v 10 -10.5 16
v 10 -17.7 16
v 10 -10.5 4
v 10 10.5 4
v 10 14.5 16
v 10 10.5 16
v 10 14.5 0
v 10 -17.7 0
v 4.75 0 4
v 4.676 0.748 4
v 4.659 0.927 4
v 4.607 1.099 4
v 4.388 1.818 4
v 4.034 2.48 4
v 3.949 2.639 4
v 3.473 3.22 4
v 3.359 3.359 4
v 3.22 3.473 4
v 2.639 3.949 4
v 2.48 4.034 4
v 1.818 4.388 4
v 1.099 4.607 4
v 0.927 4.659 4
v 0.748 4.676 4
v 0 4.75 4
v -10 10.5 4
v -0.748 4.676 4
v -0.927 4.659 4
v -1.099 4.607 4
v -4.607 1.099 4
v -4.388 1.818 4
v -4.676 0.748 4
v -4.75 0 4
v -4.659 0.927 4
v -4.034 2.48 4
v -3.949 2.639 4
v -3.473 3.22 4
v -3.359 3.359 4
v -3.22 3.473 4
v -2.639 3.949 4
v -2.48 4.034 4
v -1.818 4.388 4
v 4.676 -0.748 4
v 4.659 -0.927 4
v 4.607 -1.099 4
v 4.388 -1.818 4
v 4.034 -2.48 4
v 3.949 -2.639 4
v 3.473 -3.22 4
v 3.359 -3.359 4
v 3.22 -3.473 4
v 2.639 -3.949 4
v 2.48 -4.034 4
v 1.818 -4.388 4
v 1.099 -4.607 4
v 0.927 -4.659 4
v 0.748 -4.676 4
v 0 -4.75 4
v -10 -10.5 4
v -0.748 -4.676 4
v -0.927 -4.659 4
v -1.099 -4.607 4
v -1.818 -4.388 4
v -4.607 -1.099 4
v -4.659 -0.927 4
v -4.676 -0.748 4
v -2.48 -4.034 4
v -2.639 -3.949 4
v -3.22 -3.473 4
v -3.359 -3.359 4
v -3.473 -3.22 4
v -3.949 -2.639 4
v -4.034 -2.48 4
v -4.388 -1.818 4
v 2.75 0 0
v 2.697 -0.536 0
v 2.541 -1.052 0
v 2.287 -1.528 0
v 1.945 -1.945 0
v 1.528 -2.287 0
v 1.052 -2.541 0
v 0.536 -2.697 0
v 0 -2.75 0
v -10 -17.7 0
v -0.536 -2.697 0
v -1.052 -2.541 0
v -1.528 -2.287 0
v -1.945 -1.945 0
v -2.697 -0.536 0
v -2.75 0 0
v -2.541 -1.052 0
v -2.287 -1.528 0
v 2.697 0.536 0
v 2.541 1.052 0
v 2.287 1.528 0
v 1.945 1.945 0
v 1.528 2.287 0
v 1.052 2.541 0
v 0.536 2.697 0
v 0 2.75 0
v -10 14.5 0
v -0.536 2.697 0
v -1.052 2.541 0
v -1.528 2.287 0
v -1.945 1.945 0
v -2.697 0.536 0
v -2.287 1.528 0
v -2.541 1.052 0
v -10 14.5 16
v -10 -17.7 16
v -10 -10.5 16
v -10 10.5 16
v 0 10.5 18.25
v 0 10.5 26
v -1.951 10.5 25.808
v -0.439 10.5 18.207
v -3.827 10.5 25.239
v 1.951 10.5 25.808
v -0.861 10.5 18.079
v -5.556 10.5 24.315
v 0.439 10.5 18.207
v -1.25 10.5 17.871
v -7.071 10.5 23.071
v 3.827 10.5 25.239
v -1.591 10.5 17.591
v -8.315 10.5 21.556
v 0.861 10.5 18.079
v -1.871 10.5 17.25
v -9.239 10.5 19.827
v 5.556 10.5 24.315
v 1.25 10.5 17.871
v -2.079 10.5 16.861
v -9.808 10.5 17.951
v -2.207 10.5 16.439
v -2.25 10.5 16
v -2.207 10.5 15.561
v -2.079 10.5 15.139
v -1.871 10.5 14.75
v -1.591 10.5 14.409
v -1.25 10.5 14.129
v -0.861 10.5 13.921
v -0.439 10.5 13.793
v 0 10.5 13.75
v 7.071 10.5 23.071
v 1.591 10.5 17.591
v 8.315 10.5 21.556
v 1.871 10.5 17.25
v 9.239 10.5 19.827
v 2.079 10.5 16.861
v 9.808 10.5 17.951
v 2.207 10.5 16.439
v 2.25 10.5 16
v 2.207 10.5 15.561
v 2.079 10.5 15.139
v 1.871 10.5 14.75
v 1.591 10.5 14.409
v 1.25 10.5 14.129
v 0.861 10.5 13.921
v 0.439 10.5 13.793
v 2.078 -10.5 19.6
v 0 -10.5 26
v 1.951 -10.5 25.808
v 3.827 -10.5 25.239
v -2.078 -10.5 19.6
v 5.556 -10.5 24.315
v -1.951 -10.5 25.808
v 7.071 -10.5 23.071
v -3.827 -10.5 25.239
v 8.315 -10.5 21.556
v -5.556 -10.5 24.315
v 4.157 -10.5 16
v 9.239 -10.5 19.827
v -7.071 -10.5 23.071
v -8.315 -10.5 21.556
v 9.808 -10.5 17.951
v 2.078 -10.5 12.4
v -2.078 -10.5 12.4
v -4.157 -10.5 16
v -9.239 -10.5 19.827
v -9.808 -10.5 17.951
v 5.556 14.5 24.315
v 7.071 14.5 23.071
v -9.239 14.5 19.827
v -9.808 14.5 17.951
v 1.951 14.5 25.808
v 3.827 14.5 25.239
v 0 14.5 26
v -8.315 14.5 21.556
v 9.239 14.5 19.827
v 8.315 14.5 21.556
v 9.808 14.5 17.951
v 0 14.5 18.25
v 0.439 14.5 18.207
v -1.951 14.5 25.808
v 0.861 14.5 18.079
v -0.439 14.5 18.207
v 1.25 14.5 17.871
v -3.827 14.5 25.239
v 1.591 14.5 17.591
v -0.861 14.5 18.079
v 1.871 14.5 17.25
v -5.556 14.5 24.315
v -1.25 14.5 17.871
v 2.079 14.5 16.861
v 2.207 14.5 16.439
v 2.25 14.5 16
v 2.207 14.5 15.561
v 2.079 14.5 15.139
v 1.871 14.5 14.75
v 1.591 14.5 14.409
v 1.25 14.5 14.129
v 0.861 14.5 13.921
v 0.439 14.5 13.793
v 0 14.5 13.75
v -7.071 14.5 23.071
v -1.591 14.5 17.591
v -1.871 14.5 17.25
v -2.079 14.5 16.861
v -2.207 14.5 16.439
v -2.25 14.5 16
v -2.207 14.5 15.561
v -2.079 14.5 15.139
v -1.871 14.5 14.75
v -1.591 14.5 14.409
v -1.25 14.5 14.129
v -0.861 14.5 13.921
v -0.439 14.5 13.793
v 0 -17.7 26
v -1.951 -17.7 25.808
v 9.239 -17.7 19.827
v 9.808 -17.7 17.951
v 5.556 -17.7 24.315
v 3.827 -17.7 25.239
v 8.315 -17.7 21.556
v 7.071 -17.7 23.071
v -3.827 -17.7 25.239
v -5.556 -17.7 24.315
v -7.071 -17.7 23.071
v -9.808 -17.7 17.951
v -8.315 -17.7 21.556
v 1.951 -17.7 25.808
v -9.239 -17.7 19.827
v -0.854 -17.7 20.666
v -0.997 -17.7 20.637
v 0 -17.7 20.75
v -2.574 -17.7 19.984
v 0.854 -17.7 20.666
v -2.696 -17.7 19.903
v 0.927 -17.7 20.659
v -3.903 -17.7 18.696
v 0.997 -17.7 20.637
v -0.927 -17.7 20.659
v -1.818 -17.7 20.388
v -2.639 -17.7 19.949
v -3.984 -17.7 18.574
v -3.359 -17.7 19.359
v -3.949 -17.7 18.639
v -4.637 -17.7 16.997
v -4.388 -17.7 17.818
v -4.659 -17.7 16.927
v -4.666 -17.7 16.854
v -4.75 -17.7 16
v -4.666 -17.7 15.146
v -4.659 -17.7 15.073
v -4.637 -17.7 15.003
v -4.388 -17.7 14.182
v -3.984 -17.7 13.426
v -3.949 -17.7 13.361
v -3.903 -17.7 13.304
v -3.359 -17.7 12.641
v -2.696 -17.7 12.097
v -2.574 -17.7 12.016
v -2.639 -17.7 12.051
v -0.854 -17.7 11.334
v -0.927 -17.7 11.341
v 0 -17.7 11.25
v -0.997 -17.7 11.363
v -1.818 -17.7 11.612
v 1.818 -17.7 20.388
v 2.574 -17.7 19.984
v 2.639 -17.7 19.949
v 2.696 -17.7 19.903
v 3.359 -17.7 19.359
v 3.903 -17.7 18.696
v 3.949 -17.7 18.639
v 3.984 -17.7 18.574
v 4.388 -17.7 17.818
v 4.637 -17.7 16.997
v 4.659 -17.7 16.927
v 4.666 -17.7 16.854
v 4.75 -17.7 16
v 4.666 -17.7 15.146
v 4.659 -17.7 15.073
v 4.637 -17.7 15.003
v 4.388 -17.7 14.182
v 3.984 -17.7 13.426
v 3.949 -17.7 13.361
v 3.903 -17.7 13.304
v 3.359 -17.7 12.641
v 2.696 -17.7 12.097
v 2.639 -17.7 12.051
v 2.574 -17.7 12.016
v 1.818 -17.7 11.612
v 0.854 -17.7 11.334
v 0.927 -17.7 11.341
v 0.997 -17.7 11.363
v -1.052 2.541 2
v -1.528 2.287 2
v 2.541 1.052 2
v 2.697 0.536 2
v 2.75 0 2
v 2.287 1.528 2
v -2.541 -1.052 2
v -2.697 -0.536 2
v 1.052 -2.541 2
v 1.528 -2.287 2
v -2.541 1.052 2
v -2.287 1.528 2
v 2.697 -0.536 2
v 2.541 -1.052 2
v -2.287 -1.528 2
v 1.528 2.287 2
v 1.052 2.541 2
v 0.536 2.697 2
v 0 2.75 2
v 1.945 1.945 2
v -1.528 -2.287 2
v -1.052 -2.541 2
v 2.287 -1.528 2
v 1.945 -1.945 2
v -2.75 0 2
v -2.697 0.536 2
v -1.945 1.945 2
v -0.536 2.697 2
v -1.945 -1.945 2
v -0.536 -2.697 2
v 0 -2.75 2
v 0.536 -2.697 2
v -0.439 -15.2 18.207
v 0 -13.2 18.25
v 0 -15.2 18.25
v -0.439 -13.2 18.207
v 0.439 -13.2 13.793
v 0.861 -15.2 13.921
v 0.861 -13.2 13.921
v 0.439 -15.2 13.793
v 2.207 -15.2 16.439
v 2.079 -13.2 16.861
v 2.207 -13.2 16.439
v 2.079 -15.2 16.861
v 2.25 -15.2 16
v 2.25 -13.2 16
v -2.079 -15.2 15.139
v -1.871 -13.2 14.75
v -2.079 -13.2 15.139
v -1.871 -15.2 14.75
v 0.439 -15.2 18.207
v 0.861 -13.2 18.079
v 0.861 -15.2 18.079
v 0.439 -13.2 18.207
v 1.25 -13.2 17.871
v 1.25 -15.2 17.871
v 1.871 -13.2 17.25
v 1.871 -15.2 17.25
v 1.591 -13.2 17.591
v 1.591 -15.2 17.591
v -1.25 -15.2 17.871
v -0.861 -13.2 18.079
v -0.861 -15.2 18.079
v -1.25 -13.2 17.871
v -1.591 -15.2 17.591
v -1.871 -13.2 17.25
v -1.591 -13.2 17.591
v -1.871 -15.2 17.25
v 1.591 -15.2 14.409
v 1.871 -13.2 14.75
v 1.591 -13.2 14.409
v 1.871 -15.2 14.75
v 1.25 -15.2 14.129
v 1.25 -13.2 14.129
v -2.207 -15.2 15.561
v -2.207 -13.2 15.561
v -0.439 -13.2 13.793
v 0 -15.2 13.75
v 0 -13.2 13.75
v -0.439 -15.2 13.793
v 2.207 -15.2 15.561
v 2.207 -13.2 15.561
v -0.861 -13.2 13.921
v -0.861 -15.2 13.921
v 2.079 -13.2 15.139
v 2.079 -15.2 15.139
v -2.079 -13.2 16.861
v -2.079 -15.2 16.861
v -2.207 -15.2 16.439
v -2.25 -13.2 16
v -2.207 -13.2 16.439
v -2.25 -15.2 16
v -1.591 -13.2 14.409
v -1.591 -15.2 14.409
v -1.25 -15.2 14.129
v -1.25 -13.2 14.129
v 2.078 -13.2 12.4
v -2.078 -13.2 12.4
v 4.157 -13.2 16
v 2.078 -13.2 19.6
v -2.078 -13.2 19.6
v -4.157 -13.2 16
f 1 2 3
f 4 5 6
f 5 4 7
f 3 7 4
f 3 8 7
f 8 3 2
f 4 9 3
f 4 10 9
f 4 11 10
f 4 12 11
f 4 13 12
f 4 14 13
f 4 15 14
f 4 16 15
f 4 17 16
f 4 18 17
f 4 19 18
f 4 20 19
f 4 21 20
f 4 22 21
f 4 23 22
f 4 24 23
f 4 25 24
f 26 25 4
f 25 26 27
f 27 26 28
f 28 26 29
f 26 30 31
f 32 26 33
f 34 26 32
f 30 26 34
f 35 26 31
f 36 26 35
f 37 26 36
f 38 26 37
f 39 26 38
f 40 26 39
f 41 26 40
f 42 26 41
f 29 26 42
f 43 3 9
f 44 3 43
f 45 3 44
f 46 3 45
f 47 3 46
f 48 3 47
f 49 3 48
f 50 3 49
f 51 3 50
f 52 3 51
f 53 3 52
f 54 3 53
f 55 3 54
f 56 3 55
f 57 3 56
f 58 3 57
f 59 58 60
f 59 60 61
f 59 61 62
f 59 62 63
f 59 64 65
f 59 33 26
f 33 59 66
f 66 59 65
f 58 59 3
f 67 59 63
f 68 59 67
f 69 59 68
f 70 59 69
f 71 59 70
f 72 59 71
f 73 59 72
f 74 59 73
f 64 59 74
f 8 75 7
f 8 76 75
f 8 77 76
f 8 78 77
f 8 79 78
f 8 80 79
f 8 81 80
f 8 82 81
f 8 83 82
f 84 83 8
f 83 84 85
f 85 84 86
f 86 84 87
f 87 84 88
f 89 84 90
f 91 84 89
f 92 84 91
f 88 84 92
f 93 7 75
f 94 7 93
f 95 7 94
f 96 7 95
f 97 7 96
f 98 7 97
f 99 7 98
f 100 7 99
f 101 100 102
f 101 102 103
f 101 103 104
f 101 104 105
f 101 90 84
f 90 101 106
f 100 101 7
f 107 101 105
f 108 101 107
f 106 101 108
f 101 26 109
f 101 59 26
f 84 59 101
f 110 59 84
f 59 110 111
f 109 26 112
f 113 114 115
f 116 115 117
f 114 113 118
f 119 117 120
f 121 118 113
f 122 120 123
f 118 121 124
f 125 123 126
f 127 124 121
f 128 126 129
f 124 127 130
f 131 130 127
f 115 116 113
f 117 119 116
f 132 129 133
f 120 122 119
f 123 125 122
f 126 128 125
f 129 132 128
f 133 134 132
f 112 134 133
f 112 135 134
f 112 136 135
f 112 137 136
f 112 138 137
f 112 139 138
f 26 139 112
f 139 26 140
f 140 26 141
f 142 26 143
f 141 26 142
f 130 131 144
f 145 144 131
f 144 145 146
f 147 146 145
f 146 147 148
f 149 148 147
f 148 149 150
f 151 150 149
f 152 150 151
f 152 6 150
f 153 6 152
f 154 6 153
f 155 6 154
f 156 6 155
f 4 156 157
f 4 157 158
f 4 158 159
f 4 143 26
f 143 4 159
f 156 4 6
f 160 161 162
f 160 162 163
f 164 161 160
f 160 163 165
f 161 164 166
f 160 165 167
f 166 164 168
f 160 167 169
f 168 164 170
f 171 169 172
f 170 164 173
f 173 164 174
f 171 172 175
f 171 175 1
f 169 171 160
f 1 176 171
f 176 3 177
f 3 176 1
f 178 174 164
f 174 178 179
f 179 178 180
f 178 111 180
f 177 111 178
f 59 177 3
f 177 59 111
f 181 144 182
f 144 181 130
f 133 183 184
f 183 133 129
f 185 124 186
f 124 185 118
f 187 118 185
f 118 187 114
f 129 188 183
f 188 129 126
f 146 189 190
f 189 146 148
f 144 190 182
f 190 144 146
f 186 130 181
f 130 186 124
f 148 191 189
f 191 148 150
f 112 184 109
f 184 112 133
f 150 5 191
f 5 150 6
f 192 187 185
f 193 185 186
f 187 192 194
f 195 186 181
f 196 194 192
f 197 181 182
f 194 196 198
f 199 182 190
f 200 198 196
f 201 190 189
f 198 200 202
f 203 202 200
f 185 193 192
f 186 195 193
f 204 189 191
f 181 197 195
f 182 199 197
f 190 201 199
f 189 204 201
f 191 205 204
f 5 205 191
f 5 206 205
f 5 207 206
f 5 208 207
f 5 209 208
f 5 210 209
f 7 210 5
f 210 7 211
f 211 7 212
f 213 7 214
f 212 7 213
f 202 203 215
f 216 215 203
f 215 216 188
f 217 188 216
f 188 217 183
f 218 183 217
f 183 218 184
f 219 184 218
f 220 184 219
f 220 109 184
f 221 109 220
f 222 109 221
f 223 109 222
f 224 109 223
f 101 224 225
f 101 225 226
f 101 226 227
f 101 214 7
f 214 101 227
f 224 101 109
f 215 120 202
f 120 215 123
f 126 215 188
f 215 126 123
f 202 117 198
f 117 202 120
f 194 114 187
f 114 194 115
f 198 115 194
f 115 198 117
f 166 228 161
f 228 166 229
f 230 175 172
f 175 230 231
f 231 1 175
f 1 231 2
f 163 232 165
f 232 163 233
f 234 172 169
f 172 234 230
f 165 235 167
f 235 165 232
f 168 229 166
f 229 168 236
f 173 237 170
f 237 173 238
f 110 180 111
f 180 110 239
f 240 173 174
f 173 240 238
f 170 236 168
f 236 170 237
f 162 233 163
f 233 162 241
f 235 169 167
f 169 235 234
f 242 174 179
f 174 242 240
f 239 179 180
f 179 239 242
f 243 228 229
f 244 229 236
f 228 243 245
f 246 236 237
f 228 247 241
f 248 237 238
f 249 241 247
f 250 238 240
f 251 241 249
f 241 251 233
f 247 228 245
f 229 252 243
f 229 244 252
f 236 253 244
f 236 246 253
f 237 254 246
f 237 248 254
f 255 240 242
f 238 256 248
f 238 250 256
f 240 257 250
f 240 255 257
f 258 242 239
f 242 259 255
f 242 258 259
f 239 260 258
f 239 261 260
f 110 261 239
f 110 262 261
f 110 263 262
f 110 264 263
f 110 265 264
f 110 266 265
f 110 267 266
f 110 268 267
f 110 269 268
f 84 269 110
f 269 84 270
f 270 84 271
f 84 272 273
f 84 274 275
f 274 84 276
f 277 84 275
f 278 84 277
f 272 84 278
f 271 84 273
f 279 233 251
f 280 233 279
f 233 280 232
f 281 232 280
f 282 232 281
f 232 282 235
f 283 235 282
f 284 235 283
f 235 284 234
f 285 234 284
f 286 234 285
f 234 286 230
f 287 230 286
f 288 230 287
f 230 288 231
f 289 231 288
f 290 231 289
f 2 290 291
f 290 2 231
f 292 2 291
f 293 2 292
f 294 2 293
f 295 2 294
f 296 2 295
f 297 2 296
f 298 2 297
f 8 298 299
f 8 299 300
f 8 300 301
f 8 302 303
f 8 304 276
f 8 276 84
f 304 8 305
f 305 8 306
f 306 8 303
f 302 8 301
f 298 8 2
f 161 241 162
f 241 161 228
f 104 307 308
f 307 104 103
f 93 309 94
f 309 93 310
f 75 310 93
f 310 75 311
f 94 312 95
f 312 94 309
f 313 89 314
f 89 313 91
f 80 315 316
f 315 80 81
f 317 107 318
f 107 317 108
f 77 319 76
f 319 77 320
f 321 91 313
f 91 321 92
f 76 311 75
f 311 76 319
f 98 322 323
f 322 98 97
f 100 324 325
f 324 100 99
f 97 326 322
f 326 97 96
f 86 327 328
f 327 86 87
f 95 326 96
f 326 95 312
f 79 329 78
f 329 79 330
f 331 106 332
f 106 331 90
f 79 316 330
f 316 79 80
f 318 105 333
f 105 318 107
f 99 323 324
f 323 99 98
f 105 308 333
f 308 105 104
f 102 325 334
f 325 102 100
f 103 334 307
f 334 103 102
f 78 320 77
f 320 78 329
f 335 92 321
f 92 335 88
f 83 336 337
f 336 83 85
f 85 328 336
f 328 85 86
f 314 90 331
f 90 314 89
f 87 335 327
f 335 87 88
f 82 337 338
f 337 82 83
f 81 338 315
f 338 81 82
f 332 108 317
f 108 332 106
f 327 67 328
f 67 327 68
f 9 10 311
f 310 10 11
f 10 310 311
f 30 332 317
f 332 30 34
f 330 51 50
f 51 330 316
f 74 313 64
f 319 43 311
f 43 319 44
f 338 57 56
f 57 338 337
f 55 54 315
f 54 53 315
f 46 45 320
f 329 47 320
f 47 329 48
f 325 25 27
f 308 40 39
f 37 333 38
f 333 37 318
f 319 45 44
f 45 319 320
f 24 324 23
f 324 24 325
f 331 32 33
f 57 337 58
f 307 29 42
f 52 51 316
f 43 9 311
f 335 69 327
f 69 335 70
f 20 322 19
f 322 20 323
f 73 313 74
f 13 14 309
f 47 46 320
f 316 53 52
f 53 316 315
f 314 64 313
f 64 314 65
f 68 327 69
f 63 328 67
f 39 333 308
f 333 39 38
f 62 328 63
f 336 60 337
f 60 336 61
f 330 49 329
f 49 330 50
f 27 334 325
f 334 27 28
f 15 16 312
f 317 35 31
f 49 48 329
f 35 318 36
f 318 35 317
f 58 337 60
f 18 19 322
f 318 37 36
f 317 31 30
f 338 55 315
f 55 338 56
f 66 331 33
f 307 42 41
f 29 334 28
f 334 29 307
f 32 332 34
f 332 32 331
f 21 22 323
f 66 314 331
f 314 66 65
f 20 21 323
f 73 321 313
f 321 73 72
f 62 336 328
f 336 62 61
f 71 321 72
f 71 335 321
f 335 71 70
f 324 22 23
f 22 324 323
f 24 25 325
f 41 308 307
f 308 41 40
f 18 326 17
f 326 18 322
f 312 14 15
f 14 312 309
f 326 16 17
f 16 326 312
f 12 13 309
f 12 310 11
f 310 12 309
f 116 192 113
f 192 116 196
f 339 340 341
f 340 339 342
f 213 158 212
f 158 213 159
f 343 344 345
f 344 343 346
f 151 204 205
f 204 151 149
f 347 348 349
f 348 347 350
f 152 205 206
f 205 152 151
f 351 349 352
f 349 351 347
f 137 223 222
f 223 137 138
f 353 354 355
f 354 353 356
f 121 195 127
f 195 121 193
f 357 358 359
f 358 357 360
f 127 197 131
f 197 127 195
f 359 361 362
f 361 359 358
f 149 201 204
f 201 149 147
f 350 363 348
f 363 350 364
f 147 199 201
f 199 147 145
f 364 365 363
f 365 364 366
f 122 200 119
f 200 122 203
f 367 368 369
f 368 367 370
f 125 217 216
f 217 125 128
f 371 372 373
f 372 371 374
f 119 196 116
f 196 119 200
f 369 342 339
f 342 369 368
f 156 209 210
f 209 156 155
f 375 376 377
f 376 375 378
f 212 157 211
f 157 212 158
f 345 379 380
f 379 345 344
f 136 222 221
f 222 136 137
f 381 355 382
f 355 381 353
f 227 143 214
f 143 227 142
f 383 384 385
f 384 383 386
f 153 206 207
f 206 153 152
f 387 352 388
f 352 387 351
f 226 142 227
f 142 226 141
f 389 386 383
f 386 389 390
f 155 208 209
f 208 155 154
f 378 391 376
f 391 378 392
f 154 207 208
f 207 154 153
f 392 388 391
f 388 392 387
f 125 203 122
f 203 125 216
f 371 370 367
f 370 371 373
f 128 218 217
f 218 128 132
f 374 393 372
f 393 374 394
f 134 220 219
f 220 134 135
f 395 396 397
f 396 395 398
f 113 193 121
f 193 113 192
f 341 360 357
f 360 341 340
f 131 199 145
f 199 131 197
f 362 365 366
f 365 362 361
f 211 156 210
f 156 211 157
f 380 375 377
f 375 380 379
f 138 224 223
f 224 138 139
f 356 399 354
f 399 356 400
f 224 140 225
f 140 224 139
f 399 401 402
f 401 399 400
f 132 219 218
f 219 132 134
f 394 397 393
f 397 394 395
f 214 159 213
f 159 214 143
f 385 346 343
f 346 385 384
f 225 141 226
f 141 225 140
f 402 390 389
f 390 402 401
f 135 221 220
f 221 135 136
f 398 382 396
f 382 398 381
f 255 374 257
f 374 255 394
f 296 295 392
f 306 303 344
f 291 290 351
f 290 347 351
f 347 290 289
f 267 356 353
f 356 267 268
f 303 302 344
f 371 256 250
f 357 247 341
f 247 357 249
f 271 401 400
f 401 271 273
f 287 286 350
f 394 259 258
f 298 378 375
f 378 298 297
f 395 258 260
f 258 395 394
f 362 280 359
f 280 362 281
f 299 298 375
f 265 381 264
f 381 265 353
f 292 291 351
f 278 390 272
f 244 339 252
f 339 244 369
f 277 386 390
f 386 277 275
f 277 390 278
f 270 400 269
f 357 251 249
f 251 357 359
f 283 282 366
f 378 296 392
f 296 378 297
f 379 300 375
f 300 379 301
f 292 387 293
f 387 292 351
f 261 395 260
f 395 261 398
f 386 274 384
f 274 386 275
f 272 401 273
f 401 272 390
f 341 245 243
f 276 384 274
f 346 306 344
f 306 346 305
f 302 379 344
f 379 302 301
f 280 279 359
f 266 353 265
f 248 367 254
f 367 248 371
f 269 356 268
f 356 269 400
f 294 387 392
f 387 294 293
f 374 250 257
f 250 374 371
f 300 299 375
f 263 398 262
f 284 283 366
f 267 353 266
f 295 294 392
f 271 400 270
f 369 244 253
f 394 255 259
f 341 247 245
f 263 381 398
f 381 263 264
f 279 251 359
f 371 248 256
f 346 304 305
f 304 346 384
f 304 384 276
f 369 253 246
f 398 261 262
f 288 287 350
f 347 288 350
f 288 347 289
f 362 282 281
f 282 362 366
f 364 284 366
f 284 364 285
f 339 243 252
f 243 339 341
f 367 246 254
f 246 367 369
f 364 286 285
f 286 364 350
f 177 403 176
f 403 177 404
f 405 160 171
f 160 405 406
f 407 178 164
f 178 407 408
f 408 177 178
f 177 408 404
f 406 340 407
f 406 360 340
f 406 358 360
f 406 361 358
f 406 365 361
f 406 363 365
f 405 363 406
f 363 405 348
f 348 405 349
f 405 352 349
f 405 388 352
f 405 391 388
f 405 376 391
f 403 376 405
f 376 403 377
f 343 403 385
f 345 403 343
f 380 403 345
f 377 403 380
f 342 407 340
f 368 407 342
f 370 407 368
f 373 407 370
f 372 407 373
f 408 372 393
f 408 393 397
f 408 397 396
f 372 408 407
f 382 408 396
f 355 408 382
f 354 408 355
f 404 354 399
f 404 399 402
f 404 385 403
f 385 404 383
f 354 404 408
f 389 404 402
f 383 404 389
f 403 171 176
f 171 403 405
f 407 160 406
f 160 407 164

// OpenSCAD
// file: modules.scad
// Fonctions personnalisées

//http://forum.openscad.org/Wish-mirror-copy-true-td10681.html
module copy_mirror(vec=[0,1,0])
{
    children();
    mirror(vec) children();
}

module ecrou(plat,h){
  cylinder(d=plat*2/sqrt(3), h=h, $fn=6);
}


module courroie(diam,longueur){
  color ("black")
  difference(){
    hull(){
      cylinder(d=diam+1, h=6, $fn=32);
      translate([longueur,0,0]) cylinder(d=diam+1, h=6, $fn=32);
    }
    translate([0,0,-1])
    hull(){
      cylinder(d=diam-1, h=8, $fn=32);
      translate([longueur,0,0]) cylinder(d=diam-1, h=8, $fn=32);
    }
  }
  
  
}
// file: config.scad
// Paramètres de la machine

decal=-30;            // décallage du chassis xz
hauteur=400;          // hauteur totale chassis
largeur=400;          // largeur totale chassis
longueur=470;         // longueur totale chassis
hauteur_base=90;      // hauteur de la base
entraxe_y=140;        // distance entre les tiges Ø8 axe Y
entraxe_x=45;         // distance entre les tiges Ø8 axe X

couleur=[1,0.6,0];


// Plats écrous
ec3=5.7;
ec4=7.2;
ec5=8.2;
ec6=10.2;

// Jeu sur plats pour les écrous glissants
jec=0.2;

// hauteur écrous
ec3h=2.4;
ec4h=3.2;
ec5h=4.7;
ec6h=5.2;

// Vis
vis3=3.5;
vis4=4.5;
vis5=5.5;
vis6=6.5;


// Paramètre des pièces et jeux

// écart plateau/courroie
// y_belt_holder
belt_h=13;      // écart entre la courroie et le plateau

// écart plateau/tiges lisses
// y_lm8uu
decal_plateau=12; // Décallage en Y

// décallage des tiges lisses Y
// support_tige8_y
decal_tiges=5;

// décallage moteur Y
// y_motor
decal_motory_z=11;
decal_motory_y=25;

// Equerres de fixation position fermée
eq_ec=10;      // écart entre profilés

// Fixations axe Z
pos_z=26;      // position des axes par rapport au profilé (>= 21)
hauteur_z=20;  // hauteur des fixations
entraxe_z=17;  // distance entre les tiges Ø8 et M5
// est ce que la tige de 8 dépasse du profilé de 30?
// si oui, on décale les fixations
decalx=max(-42/2+entraxe_z+8/2+2, 0);

// Roulements linéaires
lbd = 15; // diamètre ext
lbh = 24; // hauteur

// x_carriage
he_x=23;  // entraxe hotend x
he_y=23;  // entraxe hotend y
sen_x=20; // entraxe capteur x
sen_y=23; // entraxe capteur y

// sensor_holder
sen_ep=3;   // épaisseur
sen_d=12.5; // diamètre du capteur
sen_pos=0;  // décentrage en x du capteur
sen_z=7;    // position Z de la bague

// y_belt_idler
ybi_ep1=4;       // épaisseur de la partie fixe
ybi_ep2=4;       // épaisseur de la partie mobile
ybi_h=16;        // position de l'axe
ybi_ec=11;       // écart pour le passage du ou des roulement
ybi_vis=vis4;    // diamètre passage de vis (axe)
ybi_ecrou=ec4;   // plat écrou
ybi_ecrouh=ec4h; // hauteur écrou
ybi_long=60;     // longueur de la partie mobile entre axes
ybi_prof=15;     // largeur de la partie mobile


// nombre de dents des poulies
poulie=20;

// Pas des courroies
pas=2;

// diamètre des poulies
dpoulie=poulie*pas/3.1416;
// main file
// eLKa1
// y_belt_idler
// GNU GPL v3
// lkiefer <blog.lkiefer.org> and contributors
// http://www.reprap.org/wiki/ELKa
// https://github.com/kimented/elka1

include <config.scad>;
use <modules.scad>;

module y_belt_idler_1(){
  largeur=20; //20
  $fn=32;
  echo ("y_belt_idler");
  echo ("├ écrou M4");
  echo (str("└ vis FS M4 x ", (ybi_ec+ybi_ep2*2)+1));
    
  color (couleur){
    difference(){
      union(){
        // Base
        translate([-largeur/2,-(ybi_ec+ybi_ep2*2)/2-0.5-0.5,0]) cube([largeur, (ybi_ec+ybi_ep2*2)+1+1, ybi_ep1]);
        // Coté trou simple
        translate([0,(ybi_ec+ybi_ep2*2)/2+0.5+0.5,ybi_h]) rotate([-90,0,0]) cylinder(d=largeur,h=ybi_ep1);
        translate([-largeur/2,(ybi_ec+ybi_ep2*2)/2+0.5+0.5,0]) cube([largeur,ybi_ep1,ybi_h]);
        // Coté écrou
        translate([0,-(ybi_ec+ybi_ep2*2)/2-0.5-0.5,ybi_h]) rotate([90,0,0]) cylinder(d=largeur,h=ybi_ep1+ybi_ecrouh);
        translate([-largeur/2,-(ybi_ec+ybi_ep2*2)/2-ybi_ep1-ybi_ecrouh-0.5-0.5,0]) cube([largeur,ybi_ep1+ybi_ecrouh,ybi_h]);  
      }
      // Vis fixation
      translate([0,0,-1]) cylinder(d=vis5,h=ybi_ep1+2);
      translate([0,0,ybi_ep1-2]) cylinder(d1=vis5, d2=vis5+6, h=3);
      // Vis axe
      translate([0,0,ybi_h]) rotate([90,0,0]) cylinder(d=ybi_vis, h=(ybi_ec+ybi_ep2*2)+2*ybi_ep1+2*ybi_ecrouh+2, center=true);
      translate([0,-(ybi_ec+ybi_ep2*2)/2-ybi_ep1-ybi_ecrouh+2-0.5,ybi_h]) rotate([90,0,0]) cylinder(d1=ybi_vis, d2=ybi_vis+6, h=3);
      // Écrou
      translate([0,-(ybi_ec+ybi_ep2*2)/2+1-0.5,ybi_h]) rotate([90,0,0]) ecrou(ybi_ecrou,ybi_ecrouh+1);
    }

    /*difference(){
      // Renfort
      copy_mirror([1,0,0]) translate([-largeur/2,-(ybi_ec+ybi_ep2*2)/2]) cube([3,(ybi_ec+ybi_ep2*2),ybi_h-2]);
      translate([0,0,ybi_h]) rotate([90,0,0]) cylinder(d=largeur-1, h=(ybi_ec+ybi_ep2*2)+2, center=true);
      
    }*/
  }
}

y_belt_idler_1();
